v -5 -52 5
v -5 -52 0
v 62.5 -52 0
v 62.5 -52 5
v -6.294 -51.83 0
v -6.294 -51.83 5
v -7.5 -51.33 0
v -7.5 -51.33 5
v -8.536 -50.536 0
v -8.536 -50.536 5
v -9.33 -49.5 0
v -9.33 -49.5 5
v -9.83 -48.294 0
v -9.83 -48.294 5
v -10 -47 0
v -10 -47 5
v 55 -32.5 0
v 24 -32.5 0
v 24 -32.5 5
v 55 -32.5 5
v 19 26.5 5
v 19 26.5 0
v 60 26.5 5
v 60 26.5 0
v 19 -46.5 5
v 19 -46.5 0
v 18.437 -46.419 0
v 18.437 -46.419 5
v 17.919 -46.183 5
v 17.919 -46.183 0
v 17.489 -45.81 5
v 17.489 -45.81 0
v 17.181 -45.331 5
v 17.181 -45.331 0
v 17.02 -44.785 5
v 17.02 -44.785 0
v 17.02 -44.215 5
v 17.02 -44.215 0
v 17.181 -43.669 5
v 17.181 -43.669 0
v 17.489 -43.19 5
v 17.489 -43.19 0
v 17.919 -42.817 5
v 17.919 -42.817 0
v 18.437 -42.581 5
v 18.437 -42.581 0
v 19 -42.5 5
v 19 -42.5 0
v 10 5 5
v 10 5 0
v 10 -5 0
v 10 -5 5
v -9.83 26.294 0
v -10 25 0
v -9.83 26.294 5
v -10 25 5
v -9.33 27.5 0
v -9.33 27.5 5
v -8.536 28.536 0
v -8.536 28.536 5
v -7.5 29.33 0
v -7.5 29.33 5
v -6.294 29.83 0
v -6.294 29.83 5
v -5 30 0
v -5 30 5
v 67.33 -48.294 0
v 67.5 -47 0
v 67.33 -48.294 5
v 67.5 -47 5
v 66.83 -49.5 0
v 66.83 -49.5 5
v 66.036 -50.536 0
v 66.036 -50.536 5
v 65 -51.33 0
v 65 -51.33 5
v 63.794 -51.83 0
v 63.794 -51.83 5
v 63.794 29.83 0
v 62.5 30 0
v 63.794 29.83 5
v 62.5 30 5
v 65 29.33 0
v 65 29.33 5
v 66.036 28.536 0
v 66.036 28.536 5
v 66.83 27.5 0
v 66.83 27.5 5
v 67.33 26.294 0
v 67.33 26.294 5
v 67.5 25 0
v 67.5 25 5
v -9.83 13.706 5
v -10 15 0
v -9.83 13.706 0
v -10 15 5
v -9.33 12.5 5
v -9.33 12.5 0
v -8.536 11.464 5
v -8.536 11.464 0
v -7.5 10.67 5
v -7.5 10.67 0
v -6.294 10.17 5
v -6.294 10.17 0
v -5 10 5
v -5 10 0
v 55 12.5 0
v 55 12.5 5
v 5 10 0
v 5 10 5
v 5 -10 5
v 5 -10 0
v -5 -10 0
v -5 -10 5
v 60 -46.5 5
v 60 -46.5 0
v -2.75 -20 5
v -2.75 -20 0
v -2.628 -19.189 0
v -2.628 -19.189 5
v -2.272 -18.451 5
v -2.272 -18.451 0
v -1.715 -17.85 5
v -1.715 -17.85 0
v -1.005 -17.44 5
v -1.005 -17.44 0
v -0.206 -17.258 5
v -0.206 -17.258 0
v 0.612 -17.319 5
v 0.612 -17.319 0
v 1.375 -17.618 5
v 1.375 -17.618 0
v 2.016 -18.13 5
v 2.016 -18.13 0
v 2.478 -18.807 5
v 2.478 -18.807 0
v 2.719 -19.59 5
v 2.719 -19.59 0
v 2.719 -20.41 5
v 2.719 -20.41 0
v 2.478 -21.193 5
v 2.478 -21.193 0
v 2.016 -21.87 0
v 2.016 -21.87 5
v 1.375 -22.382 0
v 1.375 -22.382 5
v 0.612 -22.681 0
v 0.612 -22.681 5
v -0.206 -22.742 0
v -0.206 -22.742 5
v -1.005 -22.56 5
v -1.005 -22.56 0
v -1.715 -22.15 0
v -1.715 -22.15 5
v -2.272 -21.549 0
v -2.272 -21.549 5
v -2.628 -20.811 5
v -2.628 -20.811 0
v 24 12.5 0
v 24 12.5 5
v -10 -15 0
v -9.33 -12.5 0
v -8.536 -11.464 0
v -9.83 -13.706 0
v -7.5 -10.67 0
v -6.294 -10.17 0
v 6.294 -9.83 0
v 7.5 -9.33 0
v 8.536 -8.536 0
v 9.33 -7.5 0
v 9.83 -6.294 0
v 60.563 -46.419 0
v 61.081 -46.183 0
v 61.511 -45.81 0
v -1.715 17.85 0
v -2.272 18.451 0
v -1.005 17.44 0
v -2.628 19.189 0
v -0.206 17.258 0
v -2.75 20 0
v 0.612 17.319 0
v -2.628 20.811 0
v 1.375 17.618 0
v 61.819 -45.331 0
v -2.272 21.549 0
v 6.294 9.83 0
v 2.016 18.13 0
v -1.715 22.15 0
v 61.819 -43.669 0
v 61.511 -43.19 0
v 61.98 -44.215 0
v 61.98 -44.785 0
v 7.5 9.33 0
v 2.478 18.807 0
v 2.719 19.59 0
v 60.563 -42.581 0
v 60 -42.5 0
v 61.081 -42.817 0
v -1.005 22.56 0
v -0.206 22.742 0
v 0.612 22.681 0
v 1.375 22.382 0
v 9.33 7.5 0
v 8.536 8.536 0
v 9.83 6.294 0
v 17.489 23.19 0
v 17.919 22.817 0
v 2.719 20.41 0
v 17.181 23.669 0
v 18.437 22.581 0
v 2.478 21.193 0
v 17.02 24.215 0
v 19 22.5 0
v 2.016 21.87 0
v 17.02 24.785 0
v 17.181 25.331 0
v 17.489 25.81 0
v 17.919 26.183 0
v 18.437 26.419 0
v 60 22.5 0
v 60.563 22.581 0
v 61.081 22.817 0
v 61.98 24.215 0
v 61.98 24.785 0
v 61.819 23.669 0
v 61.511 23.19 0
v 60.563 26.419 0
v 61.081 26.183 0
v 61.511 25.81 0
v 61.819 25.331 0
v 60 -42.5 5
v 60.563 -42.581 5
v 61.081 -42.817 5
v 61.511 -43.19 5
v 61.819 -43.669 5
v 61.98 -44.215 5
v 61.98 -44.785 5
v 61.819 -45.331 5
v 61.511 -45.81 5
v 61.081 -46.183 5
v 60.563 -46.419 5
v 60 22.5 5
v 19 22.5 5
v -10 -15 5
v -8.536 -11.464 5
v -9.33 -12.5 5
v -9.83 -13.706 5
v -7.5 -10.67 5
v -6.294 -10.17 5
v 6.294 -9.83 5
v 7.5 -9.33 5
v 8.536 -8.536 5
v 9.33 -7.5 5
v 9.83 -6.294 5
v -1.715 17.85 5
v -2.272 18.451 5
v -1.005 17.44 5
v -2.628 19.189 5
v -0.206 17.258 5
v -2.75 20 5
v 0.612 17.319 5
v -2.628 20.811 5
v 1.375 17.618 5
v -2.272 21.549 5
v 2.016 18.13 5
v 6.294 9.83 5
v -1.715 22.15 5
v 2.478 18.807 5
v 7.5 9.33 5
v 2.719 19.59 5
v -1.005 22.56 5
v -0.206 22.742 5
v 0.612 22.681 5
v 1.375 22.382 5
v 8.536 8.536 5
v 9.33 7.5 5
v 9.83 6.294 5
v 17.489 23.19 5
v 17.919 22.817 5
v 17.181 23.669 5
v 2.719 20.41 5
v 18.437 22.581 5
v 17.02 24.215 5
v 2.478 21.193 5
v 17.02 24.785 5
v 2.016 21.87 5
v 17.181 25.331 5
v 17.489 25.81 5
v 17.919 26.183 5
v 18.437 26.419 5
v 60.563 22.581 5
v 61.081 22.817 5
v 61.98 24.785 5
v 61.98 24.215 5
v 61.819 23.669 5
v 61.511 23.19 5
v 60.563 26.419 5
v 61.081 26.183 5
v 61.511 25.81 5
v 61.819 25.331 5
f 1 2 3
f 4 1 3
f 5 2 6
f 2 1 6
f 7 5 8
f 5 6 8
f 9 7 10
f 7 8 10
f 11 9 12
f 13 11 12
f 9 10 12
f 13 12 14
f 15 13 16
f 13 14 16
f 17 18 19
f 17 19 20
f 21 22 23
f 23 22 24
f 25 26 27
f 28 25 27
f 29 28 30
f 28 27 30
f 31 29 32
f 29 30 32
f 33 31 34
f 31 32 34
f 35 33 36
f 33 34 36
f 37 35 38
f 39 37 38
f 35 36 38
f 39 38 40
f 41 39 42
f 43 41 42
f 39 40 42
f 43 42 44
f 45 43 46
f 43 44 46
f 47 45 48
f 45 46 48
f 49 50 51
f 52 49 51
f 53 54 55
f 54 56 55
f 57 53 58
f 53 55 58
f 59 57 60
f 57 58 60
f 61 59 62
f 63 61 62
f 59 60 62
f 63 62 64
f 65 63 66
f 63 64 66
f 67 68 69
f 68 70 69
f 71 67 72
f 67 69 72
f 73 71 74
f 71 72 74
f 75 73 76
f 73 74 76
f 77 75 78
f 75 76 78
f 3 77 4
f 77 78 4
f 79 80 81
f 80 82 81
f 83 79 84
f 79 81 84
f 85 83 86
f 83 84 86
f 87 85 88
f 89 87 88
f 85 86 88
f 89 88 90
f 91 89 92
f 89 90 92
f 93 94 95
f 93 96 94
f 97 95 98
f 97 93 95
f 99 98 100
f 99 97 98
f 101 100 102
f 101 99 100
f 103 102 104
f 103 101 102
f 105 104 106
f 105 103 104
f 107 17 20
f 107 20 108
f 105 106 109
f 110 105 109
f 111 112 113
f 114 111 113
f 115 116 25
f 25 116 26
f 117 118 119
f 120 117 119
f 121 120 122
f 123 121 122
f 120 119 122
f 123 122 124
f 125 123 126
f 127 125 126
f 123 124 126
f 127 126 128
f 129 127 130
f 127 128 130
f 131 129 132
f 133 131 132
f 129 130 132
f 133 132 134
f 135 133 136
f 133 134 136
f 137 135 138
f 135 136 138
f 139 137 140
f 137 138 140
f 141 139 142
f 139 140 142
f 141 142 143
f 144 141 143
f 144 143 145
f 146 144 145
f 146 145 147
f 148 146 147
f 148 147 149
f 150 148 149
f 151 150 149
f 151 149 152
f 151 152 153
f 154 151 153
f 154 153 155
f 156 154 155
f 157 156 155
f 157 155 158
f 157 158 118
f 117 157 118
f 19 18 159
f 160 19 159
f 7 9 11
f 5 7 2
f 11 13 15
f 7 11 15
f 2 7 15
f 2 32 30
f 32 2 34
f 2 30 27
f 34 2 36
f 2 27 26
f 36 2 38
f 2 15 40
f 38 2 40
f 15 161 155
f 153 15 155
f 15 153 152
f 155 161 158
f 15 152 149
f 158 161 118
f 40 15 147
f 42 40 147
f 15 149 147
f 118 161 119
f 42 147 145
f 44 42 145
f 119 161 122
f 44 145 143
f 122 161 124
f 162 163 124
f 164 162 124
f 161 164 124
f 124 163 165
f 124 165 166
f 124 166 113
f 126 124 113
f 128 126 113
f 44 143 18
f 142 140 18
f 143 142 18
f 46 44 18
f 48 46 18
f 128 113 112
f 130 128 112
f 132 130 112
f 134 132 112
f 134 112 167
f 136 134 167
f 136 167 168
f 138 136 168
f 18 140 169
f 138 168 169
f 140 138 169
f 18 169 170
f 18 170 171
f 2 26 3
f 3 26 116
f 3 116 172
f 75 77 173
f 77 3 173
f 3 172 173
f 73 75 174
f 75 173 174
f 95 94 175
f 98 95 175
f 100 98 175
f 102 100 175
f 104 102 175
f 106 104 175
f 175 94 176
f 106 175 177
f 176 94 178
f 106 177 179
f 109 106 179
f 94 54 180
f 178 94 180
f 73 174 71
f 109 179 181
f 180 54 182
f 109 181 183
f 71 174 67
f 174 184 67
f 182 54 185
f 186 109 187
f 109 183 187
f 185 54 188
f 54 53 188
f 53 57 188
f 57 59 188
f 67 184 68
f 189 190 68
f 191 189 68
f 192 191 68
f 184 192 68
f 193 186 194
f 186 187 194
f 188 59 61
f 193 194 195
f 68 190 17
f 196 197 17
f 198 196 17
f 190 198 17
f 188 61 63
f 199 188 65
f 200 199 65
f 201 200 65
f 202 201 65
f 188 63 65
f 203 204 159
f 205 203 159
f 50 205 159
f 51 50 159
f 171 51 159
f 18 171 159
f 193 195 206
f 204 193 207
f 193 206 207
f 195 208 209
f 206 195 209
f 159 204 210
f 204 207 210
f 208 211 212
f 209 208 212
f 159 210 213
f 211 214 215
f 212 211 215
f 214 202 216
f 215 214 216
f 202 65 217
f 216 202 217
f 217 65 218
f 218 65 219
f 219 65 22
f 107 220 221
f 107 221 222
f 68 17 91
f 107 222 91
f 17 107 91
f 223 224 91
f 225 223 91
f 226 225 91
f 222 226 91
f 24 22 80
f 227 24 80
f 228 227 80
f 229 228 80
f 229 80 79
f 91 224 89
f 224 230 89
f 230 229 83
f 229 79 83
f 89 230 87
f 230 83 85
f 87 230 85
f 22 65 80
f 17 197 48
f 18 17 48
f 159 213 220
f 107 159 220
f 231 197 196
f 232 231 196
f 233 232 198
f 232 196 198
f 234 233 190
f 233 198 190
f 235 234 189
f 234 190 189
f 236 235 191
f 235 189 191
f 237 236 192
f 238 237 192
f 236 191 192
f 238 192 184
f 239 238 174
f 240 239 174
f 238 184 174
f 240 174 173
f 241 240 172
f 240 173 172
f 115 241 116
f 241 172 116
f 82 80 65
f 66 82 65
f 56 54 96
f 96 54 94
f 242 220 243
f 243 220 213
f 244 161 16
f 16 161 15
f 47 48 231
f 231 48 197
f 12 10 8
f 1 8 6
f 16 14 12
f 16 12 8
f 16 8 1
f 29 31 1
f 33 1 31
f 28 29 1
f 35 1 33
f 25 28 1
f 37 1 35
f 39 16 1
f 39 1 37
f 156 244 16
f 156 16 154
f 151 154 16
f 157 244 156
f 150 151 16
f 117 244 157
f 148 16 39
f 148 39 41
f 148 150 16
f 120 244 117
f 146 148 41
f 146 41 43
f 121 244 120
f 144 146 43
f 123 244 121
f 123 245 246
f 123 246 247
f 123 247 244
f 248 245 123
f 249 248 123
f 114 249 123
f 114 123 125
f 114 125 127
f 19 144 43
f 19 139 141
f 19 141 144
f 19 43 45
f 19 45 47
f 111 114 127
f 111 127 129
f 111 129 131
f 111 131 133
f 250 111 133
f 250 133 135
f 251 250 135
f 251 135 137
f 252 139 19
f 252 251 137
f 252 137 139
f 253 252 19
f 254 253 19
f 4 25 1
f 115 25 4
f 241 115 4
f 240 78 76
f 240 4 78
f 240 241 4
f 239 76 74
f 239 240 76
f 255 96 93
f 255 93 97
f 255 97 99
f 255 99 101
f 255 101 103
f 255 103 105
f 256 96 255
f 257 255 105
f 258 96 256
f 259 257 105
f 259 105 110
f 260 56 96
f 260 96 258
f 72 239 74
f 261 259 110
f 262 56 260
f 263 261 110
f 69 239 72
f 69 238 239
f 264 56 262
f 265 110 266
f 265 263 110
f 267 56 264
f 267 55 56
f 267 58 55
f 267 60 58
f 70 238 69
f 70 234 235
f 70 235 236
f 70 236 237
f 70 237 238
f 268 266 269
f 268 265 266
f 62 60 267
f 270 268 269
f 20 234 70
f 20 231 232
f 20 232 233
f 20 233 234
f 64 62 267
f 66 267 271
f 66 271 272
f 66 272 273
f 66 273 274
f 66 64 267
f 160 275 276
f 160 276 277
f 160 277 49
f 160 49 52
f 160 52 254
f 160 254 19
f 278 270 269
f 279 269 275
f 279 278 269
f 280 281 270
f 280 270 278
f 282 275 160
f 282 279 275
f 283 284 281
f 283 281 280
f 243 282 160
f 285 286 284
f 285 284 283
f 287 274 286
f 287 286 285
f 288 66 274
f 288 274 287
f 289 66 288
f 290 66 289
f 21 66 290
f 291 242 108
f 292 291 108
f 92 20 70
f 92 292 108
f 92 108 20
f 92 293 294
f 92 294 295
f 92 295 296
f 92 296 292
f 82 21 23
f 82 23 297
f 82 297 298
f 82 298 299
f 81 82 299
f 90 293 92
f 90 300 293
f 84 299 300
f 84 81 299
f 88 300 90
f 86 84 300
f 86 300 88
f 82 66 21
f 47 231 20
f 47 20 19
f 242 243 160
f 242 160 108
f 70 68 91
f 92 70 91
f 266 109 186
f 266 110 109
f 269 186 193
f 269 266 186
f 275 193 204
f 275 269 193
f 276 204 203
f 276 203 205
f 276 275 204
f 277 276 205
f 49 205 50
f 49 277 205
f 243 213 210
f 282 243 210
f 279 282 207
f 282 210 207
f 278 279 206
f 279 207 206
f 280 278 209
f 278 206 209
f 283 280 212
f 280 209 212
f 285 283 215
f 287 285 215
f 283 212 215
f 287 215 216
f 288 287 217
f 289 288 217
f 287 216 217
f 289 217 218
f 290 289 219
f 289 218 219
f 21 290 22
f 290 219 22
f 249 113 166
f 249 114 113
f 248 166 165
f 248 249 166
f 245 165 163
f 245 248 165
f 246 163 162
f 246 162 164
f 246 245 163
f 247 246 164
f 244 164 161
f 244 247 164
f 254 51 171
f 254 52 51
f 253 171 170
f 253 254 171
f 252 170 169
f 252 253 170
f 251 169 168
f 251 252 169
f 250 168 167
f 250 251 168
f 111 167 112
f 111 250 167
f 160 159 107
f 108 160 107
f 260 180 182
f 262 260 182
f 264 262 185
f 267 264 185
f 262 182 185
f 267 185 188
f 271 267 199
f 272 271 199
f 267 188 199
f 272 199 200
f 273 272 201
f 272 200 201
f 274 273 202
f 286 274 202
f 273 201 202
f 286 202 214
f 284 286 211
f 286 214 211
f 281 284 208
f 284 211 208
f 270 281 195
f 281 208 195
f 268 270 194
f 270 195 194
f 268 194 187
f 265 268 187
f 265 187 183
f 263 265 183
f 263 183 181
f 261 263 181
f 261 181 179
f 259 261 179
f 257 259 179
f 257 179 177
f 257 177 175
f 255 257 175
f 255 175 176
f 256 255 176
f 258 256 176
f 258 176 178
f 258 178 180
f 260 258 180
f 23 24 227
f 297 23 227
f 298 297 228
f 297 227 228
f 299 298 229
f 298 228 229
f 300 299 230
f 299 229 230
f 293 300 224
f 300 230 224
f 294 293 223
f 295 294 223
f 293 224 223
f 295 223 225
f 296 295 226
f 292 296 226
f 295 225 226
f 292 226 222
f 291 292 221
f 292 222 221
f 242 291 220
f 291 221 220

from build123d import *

# Parameters (mm, degrees)
SKETCH2_W            = 31
SKETCH2_H            = 45
BOSS_EXTRUDE1_DEPTH  = 5
M5_CLEARANCE_HOLE1_D = 5.5
FILLET1_R            = 5


with BuildPart() as part:
    # Sketch2 → Boss-Extrude1 (new body)
    with BuildSketch(Plane.XY):
        Polygon((-10, 30), (-10, 10), (10, 10), (10, -10), (-10, -10), (-10, -52), (67.5, -52), (67.5, 30), align=None)
        with BuildLine():
            Line((19, 26.5), (60, 26.5))
            ThreePointArc((60, 26.5), (62, 24.5), (60, 22.5))
            Line((60, 22.5), (19, 22.5))
            ThreePointArc((19, 22.5), (17, 24.5), (19, 26.5))
        make_face(mode=Mode.SUBTRACT)
        with BuildLine():
            Line((19, -42.5), (60, -42.5))
            ThreePointArc((60, -42.5), (62, -44.5), (60, -46.5))
            Line((60, -46.5), (19, -46.5))
            ThreePointArc((19, -46.5), (17, -44.5), (19, -42.5))
        make_face(mode=Mode.SUBTRACT)
        with Locations((39.5, -10)):
            Rectangle(SKETCH2_W, SKETCH2_H, mode=Mode.SUBTRACT)
    extrude(amount=BOSS_EXTRUDE1_DEPTH)

    # M5 Clearance Hole1 (through all)
    with Locations(Plane.XY.offset(5)):
        with Locations((0, 20), (0, -20)):
            Hole(M5_CLEARANCE_HOLE1_D / 2)

    # Fillet1
    fillet1_edges = [part.edges().sort_by_distance(p)[0] for p in [
        (67.5, 30, 2.5),
        (67.5, -52, 2.5),
        (-10, -52, 2.5),
        (-10, -10, 2.5),
        (10, -10, 2.5),
        (10, 10, 2.5),
        (-10, 10, 2.5),
        (-10, 30, 2.5),
    ]]
    fillet(fillet1_edges, radius=FILLET1_R)


solid = part.part
